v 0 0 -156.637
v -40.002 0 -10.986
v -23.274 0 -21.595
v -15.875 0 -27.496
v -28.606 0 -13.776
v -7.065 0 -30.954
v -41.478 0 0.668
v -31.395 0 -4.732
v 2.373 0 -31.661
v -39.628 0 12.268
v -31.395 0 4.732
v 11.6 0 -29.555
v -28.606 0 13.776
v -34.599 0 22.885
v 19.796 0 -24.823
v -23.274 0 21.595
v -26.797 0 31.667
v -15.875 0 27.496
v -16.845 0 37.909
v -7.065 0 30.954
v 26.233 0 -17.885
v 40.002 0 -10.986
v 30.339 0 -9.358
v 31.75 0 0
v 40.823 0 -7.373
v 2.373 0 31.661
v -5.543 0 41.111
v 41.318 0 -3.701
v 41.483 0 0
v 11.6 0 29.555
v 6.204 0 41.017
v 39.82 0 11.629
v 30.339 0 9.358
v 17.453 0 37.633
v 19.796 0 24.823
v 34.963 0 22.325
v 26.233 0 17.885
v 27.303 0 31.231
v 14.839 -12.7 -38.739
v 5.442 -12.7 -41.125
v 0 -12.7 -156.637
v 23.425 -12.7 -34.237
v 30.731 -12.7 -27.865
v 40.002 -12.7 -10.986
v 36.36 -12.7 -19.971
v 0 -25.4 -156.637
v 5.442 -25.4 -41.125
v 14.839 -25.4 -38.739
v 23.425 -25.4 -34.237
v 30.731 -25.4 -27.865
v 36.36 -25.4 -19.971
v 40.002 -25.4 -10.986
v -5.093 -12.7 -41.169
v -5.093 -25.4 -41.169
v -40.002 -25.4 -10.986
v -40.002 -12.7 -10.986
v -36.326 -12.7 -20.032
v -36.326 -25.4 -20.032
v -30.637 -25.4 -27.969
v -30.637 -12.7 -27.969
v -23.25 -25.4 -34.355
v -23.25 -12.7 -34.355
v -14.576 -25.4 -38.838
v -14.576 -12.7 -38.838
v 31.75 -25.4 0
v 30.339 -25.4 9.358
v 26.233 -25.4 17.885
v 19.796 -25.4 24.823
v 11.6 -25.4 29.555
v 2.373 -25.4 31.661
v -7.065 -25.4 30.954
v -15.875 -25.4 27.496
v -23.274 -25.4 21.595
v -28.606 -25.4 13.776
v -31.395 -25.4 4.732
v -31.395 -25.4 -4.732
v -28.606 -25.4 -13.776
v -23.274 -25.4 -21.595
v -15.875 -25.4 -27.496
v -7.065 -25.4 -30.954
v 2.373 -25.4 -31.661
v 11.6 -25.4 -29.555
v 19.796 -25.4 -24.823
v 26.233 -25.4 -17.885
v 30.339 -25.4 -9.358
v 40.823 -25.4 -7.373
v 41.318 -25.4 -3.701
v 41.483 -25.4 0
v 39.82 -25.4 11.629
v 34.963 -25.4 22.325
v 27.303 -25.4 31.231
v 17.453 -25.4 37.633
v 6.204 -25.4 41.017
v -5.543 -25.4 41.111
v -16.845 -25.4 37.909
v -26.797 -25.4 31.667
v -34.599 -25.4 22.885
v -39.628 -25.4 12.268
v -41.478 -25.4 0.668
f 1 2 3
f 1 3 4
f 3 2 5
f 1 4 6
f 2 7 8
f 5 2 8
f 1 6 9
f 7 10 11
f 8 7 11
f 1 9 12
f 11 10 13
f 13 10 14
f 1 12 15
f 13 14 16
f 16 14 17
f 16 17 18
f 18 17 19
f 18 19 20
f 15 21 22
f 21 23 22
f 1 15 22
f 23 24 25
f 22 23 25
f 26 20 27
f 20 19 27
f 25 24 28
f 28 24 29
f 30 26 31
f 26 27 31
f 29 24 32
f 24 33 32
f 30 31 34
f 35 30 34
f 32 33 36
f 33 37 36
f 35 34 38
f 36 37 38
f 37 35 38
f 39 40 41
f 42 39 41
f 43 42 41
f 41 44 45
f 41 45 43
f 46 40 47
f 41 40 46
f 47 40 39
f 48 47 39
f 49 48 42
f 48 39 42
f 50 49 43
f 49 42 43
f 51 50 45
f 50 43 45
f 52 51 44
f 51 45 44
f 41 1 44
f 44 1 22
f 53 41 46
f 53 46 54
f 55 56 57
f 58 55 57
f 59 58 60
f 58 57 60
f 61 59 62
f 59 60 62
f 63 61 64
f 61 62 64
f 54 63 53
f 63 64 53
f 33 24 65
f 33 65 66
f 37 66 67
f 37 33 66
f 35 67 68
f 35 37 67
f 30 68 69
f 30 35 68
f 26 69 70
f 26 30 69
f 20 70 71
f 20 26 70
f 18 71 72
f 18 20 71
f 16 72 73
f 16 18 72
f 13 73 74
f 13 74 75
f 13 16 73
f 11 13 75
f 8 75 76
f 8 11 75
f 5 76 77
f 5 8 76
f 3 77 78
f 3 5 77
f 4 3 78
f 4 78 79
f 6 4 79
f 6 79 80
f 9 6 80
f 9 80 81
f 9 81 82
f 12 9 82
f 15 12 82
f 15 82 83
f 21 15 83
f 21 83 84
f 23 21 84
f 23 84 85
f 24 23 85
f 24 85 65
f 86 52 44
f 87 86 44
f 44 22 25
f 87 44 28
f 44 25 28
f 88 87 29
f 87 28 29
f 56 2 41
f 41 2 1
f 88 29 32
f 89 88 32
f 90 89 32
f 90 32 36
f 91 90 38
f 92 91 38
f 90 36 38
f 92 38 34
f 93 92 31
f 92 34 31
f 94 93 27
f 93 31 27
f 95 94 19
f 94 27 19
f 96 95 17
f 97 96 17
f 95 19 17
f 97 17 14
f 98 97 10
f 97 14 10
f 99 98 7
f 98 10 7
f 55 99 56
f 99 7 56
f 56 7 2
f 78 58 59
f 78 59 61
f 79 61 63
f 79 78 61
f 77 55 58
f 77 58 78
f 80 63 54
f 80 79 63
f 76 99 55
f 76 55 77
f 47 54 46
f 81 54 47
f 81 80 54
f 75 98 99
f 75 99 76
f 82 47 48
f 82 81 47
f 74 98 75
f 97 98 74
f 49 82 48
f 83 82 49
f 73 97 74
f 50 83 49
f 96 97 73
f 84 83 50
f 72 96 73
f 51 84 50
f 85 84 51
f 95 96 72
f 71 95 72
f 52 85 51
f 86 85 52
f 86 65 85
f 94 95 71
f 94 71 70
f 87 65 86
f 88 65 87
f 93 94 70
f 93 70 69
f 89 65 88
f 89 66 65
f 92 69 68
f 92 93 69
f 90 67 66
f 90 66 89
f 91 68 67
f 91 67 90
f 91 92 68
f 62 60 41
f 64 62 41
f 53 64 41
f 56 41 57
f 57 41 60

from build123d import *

# Parameters (mm, degrees)
F0_R     = 31.75
F1_DEPTH = 25.4
F2_DEPTH = 12.7
F4_DEPTH = 25.4


with BuildPart() as f1:
    # F0 (on Front) → F1 (new body)
    with BuildSketch(Plane.XZ):
        with BuildLine():
            ThreePointArc((40.001993, -10.986297), (41.111251, -5.542851), (41.483227, 0))
            ThreePointArc((41.483227, 0), (-5.542851, 41.111251), (-40.001993, -10.986297))
            ThreePointArc((-40.001993, -10.986297), (0, -41.483227), (40.001993, -10.986297))
        make_face()
        Circle(F0_R, mode=Mode.SUBTRACT)
    extrude(amount=F1_DEPTH)

    # F0 (on Front) → F2 (join)
    with BuildSketch(Plane.XZ):
        with BuildLine():
            ThreePointArc((40.001993, -10.986297), (41.111251, -5.542851), (41.483227, 0))
            ThreePointArc((41.483227, 0), (-5.542851, 41.111251), (-40.001993, -10.986297))
            ThreePointArc((-40.001993, -10.986297), (0, -41.483227), (40.001993, -10.986297))
        make_face()
        Circle(F0_R, mode=Mode.SUBTRACT)
        with BuildLine():
            ThreePointArc((40.001993, -10.986297), (0, -41.483227), (-40.001993, -10.986297))
            Line((-40.001993, -10.986297), (0, -156.636773))
            Line((0, -156.636773), (40.001993, -10.986297))
        make_face()
    extrude(amount=F2_DEPTH)

    # F3 (on face) → F4 (join)
    with BuildSketch(Plane(origin=(0, 0, 0), x_dir=(-1, 0, 0), z_dir=(0, 1, 0))):
        Polygon((5.272433, -37.112545), (-5.63112, -37.112545), (0, -156.636773), align=None)
    extrude(amount=-F4_DEPTH)


solid = f1.part
